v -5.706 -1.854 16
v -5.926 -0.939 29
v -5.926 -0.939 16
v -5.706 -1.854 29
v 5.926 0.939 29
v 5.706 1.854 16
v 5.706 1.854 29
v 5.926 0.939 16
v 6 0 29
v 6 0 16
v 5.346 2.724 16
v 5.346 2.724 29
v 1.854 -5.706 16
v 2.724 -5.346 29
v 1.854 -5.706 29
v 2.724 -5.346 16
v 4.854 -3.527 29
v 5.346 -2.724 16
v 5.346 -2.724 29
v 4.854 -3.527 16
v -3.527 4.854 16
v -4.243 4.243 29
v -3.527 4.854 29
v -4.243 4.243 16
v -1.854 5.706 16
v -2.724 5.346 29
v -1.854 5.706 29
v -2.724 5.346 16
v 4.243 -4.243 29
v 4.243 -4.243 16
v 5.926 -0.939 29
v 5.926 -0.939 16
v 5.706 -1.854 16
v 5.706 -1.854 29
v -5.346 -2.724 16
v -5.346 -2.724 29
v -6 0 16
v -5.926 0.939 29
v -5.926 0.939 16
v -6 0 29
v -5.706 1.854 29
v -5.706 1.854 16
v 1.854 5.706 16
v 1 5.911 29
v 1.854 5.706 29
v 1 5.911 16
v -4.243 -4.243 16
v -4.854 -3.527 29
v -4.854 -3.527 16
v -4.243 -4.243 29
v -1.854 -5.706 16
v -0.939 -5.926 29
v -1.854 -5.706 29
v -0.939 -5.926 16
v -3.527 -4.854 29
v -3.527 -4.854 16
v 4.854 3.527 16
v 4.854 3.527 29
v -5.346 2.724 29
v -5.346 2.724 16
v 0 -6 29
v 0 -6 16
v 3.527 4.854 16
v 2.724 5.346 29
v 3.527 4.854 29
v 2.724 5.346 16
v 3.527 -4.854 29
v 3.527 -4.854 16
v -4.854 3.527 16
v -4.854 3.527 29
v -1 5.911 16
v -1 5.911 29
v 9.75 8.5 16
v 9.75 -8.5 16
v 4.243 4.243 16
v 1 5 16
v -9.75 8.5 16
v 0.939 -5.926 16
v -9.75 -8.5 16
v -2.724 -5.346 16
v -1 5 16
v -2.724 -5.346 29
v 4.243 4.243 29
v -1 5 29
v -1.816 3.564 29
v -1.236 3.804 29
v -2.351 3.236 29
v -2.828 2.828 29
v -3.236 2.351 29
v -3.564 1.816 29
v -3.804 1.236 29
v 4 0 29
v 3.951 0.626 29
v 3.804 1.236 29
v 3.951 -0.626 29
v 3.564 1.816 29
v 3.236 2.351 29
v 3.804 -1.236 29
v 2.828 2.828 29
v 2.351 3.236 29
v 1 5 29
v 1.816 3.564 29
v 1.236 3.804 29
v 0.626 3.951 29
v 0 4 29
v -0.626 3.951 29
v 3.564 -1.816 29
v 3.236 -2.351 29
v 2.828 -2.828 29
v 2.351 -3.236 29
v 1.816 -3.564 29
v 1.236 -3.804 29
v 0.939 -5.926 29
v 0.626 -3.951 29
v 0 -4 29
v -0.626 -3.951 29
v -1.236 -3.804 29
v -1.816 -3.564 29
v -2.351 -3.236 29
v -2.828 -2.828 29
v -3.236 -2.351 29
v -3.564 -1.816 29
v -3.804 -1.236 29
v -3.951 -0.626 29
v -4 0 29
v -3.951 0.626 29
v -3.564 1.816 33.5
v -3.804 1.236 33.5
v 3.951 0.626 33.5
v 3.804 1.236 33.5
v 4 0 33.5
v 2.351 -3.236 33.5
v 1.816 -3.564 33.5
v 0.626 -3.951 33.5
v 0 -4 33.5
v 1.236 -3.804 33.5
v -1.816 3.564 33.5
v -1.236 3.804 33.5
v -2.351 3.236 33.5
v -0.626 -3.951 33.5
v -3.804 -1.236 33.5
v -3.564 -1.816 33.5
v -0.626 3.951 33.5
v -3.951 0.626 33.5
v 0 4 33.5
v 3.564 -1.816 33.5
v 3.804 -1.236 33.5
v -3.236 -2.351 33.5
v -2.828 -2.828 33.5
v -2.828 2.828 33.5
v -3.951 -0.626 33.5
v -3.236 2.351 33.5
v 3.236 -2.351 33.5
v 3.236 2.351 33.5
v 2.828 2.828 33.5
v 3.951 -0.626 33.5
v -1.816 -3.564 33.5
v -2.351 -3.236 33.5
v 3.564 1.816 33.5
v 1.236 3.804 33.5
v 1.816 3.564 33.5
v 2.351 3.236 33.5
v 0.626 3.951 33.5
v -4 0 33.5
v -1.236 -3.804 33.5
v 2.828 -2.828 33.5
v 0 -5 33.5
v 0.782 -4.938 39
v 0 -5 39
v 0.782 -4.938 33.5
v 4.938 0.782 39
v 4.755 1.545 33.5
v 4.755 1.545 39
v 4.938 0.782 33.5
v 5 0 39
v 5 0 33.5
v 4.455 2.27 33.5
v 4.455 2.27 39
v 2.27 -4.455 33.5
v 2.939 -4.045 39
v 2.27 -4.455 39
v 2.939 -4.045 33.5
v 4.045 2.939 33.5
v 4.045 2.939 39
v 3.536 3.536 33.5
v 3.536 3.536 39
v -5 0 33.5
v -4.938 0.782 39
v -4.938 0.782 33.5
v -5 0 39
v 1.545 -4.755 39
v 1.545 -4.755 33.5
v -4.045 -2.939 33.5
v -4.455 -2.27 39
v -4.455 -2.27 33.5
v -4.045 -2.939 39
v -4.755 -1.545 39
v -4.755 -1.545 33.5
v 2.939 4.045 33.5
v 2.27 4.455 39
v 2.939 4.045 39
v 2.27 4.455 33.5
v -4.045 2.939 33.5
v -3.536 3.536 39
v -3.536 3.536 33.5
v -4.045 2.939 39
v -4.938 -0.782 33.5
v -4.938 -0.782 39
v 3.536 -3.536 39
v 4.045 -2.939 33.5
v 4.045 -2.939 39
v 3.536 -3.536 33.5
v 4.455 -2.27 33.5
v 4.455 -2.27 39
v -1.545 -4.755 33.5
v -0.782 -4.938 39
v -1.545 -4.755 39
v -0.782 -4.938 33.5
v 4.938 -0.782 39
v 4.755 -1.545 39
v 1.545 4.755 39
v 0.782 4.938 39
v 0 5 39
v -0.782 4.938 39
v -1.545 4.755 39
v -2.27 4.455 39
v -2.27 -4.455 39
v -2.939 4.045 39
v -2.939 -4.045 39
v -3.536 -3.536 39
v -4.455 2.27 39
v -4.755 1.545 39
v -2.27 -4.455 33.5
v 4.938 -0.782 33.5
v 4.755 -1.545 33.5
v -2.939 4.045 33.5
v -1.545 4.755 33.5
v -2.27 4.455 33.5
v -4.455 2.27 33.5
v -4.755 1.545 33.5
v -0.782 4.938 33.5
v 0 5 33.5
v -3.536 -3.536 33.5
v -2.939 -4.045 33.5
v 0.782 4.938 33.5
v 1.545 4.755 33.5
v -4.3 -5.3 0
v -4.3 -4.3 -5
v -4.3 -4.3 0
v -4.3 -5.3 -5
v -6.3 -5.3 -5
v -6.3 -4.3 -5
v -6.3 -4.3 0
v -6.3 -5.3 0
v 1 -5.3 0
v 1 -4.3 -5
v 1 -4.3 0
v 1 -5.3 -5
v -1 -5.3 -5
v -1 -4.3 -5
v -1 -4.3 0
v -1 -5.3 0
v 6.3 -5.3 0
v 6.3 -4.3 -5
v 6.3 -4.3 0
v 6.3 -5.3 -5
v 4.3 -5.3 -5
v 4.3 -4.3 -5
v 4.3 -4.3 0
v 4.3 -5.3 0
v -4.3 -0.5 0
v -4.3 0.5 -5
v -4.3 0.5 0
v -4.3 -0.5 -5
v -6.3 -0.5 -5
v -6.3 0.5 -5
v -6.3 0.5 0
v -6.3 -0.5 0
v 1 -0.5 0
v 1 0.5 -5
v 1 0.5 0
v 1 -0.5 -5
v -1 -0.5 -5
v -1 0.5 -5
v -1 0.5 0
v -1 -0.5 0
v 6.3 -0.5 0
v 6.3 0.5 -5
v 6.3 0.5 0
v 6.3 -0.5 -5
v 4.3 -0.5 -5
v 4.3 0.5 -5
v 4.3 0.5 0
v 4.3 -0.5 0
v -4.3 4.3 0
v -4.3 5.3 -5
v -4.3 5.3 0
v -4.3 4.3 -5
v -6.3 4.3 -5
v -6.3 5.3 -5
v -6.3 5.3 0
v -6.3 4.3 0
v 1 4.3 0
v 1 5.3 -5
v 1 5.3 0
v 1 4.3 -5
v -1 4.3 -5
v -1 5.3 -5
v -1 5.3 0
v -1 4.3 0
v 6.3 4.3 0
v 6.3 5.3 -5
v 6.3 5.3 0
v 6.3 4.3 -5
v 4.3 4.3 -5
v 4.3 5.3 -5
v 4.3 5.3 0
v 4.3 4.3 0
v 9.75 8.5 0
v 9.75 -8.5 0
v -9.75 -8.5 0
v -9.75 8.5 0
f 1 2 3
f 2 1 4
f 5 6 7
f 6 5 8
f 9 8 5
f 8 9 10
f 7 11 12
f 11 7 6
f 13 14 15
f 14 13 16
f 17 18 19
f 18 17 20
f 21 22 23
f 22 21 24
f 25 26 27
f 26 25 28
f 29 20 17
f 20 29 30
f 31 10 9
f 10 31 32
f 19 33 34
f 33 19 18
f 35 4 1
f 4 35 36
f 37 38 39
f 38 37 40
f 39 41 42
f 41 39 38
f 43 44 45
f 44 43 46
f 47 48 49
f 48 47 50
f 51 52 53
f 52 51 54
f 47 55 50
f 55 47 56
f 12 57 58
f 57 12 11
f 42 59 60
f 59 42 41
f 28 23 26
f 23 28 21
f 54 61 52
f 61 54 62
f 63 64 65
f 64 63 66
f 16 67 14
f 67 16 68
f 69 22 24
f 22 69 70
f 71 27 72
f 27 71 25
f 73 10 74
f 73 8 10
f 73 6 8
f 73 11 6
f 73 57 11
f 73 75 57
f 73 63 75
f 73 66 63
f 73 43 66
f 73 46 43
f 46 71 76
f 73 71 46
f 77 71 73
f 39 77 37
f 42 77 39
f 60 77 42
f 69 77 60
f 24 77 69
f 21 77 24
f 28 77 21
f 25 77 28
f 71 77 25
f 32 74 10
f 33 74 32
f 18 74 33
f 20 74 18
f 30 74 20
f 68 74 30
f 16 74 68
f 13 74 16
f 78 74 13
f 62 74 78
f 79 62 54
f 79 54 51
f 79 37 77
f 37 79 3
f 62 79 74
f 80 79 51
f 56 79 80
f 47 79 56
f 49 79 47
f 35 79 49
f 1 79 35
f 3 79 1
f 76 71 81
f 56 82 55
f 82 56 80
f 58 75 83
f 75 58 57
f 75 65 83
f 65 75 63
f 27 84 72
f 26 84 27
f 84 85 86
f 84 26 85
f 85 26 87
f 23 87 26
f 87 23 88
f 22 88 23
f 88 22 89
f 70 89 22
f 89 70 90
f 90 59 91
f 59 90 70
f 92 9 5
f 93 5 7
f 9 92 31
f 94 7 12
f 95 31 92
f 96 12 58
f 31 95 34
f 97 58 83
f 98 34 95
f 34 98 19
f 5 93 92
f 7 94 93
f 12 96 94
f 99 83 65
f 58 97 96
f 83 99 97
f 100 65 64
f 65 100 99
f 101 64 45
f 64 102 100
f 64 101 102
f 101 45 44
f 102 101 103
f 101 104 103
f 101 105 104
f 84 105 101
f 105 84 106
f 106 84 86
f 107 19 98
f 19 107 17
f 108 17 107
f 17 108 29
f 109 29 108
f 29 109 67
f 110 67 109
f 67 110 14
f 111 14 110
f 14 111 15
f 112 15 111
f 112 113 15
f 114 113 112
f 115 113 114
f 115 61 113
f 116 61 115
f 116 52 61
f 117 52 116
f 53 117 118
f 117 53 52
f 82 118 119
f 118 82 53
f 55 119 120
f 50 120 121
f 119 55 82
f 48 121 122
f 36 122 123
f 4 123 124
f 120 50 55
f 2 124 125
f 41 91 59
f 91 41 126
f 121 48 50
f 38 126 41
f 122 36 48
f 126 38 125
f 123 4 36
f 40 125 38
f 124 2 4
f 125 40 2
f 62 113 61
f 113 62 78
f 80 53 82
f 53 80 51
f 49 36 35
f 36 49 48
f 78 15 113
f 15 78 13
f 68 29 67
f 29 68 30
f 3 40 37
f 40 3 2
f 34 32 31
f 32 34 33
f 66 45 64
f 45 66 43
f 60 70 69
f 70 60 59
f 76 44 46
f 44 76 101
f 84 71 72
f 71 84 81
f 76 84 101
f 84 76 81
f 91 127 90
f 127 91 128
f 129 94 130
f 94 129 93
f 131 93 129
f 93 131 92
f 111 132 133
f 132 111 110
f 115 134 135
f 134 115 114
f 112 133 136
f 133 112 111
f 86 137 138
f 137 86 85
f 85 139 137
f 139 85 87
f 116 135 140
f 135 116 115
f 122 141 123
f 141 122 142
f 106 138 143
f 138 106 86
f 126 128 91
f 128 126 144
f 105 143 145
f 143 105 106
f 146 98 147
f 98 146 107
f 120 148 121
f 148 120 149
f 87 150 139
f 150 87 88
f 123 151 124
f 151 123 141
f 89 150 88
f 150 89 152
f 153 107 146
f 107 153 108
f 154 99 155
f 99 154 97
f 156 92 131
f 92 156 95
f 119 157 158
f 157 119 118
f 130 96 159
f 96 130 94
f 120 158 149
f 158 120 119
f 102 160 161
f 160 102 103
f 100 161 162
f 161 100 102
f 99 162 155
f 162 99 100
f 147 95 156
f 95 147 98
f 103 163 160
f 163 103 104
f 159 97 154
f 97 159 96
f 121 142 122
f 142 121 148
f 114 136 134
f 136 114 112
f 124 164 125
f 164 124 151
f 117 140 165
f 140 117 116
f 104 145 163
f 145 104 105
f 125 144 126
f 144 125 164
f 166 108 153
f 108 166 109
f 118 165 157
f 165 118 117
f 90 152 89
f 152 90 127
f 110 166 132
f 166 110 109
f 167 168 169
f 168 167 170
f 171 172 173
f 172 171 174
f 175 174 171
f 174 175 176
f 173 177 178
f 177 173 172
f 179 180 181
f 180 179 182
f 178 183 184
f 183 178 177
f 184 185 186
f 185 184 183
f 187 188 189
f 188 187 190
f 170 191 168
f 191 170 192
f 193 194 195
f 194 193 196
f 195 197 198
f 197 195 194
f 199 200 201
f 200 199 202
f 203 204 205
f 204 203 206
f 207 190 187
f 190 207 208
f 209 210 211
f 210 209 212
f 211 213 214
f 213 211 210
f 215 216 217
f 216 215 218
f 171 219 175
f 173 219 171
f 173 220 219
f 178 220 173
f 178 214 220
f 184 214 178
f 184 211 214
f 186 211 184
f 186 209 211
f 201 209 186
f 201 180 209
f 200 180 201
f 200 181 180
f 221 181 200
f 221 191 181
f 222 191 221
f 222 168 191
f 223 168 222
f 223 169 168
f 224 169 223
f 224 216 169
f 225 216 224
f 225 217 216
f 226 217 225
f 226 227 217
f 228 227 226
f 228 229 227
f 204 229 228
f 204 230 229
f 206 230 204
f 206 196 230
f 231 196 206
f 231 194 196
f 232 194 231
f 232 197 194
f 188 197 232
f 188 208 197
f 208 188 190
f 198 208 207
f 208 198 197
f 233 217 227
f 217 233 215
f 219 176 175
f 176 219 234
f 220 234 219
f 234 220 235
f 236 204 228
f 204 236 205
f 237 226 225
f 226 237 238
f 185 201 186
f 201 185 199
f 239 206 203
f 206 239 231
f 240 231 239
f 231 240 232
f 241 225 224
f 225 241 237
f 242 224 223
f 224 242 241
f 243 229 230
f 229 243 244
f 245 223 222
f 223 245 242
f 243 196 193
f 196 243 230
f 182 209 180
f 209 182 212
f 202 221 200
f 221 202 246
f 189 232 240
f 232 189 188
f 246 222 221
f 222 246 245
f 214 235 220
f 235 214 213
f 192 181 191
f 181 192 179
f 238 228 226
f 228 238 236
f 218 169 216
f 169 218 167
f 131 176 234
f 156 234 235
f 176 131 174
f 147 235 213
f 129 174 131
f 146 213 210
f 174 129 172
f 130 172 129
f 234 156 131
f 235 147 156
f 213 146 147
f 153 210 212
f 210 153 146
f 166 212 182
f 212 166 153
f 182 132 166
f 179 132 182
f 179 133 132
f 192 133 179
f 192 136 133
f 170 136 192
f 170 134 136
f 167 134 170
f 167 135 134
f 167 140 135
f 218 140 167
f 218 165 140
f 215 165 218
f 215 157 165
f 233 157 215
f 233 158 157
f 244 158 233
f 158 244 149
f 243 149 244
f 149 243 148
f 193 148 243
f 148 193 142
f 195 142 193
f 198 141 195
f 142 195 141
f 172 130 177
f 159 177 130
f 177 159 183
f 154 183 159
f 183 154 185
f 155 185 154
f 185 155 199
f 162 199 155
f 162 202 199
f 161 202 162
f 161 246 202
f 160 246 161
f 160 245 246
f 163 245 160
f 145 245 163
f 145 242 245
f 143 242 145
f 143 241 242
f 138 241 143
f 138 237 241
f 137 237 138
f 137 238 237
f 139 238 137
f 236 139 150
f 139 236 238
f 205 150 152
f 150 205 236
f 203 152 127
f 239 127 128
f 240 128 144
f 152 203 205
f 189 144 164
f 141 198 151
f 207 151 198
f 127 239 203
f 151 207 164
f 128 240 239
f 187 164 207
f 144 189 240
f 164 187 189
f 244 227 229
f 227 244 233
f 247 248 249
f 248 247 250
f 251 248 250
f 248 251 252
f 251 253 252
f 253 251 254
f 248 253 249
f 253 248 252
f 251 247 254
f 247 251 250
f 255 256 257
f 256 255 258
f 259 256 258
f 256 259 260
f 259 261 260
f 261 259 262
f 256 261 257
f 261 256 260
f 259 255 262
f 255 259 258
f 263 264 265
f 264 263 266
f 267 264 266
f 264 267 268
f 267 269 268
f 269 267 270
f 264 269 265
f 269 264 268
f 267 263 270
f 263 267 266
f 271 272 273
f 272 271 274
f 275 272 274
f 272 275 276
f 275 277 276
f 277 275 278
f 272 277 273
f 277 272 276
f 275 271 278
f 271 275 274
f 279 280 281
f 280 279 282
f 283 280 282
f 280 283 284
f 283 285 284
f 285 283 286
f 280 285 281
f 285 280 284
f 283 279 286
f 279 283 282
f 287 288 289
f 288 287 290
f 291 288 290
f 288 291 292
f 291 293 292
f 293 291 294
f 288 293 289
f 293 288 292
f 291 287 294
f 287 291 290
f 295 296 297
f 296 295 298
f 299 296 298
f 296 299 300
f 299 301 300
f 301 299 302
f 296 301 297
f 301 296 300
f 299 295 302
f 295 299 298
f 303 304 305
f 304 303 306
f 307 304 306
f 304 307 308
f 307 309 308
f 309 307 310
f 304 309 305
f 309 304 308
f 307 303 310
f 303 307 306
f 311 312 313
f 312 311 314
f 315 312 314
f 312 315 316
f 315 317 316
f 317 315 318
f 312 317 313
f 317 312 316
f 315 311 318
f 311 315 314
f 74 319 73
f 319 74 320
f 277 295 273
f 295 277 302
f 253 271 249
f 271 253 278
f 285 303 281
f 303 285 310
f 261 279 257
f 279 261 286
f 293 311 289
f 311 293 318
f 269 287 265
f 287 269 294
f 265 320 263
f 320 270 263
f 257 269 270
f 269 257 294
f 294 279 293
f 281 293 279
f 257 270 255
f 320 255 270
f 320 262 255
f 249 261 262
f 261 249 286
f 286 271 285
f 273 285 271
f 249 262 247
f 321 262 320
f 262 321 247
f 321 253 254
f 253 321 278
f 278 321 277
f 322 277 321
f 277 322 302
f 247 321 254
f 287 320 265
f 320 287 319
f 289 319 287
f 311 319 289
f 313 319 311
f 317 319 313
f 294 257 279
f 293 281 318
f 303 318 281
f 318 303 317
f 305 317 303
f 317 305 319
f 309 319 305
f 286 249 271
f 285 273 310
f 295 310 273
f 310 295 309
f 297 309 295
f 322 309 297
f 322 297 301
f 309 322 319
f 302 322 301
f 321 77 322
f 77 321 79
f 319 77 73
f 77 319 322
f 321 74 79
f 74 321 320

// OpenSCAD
$fn=40;

red = [0.8,0.2,0.2];
black = [0.2,0.2,0.2];
silver = [0.75,0.75,0.75];
epsilon = 0.001;

// The model is centered
pins = [ [ -5.3, -4.8], [0, -4.8], [5.3, -4.8],
	 [ -5.3,  0],   [0,  0],   [5.3,  0],
	 [ -5.3,  4.8], [0,  4.8], [5.3,  4.8] ];

module base()
{
    color(red) translate([0,0,8])
	cube([19.5, 17, 16], center=true);
}

module body()
{
    difference() {
	translate([0,0,16])
	    cylinder(13, d=12);
	translate([-1,5,16-epsilon])
	    cube([2,1,14]);
    }
}

module switch()
{
    translate([0,0,28])
	cylinder(6, d=8);
    translate([0,0,33.5])
	cylinder(5.5, d=10);
}

module stomp()
{
    color(red) base();
    color(silver) union() { body(); switch(); }

    // Pins
    color(silver) for (pos = pins)
	translate(pos) translate([0,0,-2]) cube([2,1,6], center=true);
}

stomp();
